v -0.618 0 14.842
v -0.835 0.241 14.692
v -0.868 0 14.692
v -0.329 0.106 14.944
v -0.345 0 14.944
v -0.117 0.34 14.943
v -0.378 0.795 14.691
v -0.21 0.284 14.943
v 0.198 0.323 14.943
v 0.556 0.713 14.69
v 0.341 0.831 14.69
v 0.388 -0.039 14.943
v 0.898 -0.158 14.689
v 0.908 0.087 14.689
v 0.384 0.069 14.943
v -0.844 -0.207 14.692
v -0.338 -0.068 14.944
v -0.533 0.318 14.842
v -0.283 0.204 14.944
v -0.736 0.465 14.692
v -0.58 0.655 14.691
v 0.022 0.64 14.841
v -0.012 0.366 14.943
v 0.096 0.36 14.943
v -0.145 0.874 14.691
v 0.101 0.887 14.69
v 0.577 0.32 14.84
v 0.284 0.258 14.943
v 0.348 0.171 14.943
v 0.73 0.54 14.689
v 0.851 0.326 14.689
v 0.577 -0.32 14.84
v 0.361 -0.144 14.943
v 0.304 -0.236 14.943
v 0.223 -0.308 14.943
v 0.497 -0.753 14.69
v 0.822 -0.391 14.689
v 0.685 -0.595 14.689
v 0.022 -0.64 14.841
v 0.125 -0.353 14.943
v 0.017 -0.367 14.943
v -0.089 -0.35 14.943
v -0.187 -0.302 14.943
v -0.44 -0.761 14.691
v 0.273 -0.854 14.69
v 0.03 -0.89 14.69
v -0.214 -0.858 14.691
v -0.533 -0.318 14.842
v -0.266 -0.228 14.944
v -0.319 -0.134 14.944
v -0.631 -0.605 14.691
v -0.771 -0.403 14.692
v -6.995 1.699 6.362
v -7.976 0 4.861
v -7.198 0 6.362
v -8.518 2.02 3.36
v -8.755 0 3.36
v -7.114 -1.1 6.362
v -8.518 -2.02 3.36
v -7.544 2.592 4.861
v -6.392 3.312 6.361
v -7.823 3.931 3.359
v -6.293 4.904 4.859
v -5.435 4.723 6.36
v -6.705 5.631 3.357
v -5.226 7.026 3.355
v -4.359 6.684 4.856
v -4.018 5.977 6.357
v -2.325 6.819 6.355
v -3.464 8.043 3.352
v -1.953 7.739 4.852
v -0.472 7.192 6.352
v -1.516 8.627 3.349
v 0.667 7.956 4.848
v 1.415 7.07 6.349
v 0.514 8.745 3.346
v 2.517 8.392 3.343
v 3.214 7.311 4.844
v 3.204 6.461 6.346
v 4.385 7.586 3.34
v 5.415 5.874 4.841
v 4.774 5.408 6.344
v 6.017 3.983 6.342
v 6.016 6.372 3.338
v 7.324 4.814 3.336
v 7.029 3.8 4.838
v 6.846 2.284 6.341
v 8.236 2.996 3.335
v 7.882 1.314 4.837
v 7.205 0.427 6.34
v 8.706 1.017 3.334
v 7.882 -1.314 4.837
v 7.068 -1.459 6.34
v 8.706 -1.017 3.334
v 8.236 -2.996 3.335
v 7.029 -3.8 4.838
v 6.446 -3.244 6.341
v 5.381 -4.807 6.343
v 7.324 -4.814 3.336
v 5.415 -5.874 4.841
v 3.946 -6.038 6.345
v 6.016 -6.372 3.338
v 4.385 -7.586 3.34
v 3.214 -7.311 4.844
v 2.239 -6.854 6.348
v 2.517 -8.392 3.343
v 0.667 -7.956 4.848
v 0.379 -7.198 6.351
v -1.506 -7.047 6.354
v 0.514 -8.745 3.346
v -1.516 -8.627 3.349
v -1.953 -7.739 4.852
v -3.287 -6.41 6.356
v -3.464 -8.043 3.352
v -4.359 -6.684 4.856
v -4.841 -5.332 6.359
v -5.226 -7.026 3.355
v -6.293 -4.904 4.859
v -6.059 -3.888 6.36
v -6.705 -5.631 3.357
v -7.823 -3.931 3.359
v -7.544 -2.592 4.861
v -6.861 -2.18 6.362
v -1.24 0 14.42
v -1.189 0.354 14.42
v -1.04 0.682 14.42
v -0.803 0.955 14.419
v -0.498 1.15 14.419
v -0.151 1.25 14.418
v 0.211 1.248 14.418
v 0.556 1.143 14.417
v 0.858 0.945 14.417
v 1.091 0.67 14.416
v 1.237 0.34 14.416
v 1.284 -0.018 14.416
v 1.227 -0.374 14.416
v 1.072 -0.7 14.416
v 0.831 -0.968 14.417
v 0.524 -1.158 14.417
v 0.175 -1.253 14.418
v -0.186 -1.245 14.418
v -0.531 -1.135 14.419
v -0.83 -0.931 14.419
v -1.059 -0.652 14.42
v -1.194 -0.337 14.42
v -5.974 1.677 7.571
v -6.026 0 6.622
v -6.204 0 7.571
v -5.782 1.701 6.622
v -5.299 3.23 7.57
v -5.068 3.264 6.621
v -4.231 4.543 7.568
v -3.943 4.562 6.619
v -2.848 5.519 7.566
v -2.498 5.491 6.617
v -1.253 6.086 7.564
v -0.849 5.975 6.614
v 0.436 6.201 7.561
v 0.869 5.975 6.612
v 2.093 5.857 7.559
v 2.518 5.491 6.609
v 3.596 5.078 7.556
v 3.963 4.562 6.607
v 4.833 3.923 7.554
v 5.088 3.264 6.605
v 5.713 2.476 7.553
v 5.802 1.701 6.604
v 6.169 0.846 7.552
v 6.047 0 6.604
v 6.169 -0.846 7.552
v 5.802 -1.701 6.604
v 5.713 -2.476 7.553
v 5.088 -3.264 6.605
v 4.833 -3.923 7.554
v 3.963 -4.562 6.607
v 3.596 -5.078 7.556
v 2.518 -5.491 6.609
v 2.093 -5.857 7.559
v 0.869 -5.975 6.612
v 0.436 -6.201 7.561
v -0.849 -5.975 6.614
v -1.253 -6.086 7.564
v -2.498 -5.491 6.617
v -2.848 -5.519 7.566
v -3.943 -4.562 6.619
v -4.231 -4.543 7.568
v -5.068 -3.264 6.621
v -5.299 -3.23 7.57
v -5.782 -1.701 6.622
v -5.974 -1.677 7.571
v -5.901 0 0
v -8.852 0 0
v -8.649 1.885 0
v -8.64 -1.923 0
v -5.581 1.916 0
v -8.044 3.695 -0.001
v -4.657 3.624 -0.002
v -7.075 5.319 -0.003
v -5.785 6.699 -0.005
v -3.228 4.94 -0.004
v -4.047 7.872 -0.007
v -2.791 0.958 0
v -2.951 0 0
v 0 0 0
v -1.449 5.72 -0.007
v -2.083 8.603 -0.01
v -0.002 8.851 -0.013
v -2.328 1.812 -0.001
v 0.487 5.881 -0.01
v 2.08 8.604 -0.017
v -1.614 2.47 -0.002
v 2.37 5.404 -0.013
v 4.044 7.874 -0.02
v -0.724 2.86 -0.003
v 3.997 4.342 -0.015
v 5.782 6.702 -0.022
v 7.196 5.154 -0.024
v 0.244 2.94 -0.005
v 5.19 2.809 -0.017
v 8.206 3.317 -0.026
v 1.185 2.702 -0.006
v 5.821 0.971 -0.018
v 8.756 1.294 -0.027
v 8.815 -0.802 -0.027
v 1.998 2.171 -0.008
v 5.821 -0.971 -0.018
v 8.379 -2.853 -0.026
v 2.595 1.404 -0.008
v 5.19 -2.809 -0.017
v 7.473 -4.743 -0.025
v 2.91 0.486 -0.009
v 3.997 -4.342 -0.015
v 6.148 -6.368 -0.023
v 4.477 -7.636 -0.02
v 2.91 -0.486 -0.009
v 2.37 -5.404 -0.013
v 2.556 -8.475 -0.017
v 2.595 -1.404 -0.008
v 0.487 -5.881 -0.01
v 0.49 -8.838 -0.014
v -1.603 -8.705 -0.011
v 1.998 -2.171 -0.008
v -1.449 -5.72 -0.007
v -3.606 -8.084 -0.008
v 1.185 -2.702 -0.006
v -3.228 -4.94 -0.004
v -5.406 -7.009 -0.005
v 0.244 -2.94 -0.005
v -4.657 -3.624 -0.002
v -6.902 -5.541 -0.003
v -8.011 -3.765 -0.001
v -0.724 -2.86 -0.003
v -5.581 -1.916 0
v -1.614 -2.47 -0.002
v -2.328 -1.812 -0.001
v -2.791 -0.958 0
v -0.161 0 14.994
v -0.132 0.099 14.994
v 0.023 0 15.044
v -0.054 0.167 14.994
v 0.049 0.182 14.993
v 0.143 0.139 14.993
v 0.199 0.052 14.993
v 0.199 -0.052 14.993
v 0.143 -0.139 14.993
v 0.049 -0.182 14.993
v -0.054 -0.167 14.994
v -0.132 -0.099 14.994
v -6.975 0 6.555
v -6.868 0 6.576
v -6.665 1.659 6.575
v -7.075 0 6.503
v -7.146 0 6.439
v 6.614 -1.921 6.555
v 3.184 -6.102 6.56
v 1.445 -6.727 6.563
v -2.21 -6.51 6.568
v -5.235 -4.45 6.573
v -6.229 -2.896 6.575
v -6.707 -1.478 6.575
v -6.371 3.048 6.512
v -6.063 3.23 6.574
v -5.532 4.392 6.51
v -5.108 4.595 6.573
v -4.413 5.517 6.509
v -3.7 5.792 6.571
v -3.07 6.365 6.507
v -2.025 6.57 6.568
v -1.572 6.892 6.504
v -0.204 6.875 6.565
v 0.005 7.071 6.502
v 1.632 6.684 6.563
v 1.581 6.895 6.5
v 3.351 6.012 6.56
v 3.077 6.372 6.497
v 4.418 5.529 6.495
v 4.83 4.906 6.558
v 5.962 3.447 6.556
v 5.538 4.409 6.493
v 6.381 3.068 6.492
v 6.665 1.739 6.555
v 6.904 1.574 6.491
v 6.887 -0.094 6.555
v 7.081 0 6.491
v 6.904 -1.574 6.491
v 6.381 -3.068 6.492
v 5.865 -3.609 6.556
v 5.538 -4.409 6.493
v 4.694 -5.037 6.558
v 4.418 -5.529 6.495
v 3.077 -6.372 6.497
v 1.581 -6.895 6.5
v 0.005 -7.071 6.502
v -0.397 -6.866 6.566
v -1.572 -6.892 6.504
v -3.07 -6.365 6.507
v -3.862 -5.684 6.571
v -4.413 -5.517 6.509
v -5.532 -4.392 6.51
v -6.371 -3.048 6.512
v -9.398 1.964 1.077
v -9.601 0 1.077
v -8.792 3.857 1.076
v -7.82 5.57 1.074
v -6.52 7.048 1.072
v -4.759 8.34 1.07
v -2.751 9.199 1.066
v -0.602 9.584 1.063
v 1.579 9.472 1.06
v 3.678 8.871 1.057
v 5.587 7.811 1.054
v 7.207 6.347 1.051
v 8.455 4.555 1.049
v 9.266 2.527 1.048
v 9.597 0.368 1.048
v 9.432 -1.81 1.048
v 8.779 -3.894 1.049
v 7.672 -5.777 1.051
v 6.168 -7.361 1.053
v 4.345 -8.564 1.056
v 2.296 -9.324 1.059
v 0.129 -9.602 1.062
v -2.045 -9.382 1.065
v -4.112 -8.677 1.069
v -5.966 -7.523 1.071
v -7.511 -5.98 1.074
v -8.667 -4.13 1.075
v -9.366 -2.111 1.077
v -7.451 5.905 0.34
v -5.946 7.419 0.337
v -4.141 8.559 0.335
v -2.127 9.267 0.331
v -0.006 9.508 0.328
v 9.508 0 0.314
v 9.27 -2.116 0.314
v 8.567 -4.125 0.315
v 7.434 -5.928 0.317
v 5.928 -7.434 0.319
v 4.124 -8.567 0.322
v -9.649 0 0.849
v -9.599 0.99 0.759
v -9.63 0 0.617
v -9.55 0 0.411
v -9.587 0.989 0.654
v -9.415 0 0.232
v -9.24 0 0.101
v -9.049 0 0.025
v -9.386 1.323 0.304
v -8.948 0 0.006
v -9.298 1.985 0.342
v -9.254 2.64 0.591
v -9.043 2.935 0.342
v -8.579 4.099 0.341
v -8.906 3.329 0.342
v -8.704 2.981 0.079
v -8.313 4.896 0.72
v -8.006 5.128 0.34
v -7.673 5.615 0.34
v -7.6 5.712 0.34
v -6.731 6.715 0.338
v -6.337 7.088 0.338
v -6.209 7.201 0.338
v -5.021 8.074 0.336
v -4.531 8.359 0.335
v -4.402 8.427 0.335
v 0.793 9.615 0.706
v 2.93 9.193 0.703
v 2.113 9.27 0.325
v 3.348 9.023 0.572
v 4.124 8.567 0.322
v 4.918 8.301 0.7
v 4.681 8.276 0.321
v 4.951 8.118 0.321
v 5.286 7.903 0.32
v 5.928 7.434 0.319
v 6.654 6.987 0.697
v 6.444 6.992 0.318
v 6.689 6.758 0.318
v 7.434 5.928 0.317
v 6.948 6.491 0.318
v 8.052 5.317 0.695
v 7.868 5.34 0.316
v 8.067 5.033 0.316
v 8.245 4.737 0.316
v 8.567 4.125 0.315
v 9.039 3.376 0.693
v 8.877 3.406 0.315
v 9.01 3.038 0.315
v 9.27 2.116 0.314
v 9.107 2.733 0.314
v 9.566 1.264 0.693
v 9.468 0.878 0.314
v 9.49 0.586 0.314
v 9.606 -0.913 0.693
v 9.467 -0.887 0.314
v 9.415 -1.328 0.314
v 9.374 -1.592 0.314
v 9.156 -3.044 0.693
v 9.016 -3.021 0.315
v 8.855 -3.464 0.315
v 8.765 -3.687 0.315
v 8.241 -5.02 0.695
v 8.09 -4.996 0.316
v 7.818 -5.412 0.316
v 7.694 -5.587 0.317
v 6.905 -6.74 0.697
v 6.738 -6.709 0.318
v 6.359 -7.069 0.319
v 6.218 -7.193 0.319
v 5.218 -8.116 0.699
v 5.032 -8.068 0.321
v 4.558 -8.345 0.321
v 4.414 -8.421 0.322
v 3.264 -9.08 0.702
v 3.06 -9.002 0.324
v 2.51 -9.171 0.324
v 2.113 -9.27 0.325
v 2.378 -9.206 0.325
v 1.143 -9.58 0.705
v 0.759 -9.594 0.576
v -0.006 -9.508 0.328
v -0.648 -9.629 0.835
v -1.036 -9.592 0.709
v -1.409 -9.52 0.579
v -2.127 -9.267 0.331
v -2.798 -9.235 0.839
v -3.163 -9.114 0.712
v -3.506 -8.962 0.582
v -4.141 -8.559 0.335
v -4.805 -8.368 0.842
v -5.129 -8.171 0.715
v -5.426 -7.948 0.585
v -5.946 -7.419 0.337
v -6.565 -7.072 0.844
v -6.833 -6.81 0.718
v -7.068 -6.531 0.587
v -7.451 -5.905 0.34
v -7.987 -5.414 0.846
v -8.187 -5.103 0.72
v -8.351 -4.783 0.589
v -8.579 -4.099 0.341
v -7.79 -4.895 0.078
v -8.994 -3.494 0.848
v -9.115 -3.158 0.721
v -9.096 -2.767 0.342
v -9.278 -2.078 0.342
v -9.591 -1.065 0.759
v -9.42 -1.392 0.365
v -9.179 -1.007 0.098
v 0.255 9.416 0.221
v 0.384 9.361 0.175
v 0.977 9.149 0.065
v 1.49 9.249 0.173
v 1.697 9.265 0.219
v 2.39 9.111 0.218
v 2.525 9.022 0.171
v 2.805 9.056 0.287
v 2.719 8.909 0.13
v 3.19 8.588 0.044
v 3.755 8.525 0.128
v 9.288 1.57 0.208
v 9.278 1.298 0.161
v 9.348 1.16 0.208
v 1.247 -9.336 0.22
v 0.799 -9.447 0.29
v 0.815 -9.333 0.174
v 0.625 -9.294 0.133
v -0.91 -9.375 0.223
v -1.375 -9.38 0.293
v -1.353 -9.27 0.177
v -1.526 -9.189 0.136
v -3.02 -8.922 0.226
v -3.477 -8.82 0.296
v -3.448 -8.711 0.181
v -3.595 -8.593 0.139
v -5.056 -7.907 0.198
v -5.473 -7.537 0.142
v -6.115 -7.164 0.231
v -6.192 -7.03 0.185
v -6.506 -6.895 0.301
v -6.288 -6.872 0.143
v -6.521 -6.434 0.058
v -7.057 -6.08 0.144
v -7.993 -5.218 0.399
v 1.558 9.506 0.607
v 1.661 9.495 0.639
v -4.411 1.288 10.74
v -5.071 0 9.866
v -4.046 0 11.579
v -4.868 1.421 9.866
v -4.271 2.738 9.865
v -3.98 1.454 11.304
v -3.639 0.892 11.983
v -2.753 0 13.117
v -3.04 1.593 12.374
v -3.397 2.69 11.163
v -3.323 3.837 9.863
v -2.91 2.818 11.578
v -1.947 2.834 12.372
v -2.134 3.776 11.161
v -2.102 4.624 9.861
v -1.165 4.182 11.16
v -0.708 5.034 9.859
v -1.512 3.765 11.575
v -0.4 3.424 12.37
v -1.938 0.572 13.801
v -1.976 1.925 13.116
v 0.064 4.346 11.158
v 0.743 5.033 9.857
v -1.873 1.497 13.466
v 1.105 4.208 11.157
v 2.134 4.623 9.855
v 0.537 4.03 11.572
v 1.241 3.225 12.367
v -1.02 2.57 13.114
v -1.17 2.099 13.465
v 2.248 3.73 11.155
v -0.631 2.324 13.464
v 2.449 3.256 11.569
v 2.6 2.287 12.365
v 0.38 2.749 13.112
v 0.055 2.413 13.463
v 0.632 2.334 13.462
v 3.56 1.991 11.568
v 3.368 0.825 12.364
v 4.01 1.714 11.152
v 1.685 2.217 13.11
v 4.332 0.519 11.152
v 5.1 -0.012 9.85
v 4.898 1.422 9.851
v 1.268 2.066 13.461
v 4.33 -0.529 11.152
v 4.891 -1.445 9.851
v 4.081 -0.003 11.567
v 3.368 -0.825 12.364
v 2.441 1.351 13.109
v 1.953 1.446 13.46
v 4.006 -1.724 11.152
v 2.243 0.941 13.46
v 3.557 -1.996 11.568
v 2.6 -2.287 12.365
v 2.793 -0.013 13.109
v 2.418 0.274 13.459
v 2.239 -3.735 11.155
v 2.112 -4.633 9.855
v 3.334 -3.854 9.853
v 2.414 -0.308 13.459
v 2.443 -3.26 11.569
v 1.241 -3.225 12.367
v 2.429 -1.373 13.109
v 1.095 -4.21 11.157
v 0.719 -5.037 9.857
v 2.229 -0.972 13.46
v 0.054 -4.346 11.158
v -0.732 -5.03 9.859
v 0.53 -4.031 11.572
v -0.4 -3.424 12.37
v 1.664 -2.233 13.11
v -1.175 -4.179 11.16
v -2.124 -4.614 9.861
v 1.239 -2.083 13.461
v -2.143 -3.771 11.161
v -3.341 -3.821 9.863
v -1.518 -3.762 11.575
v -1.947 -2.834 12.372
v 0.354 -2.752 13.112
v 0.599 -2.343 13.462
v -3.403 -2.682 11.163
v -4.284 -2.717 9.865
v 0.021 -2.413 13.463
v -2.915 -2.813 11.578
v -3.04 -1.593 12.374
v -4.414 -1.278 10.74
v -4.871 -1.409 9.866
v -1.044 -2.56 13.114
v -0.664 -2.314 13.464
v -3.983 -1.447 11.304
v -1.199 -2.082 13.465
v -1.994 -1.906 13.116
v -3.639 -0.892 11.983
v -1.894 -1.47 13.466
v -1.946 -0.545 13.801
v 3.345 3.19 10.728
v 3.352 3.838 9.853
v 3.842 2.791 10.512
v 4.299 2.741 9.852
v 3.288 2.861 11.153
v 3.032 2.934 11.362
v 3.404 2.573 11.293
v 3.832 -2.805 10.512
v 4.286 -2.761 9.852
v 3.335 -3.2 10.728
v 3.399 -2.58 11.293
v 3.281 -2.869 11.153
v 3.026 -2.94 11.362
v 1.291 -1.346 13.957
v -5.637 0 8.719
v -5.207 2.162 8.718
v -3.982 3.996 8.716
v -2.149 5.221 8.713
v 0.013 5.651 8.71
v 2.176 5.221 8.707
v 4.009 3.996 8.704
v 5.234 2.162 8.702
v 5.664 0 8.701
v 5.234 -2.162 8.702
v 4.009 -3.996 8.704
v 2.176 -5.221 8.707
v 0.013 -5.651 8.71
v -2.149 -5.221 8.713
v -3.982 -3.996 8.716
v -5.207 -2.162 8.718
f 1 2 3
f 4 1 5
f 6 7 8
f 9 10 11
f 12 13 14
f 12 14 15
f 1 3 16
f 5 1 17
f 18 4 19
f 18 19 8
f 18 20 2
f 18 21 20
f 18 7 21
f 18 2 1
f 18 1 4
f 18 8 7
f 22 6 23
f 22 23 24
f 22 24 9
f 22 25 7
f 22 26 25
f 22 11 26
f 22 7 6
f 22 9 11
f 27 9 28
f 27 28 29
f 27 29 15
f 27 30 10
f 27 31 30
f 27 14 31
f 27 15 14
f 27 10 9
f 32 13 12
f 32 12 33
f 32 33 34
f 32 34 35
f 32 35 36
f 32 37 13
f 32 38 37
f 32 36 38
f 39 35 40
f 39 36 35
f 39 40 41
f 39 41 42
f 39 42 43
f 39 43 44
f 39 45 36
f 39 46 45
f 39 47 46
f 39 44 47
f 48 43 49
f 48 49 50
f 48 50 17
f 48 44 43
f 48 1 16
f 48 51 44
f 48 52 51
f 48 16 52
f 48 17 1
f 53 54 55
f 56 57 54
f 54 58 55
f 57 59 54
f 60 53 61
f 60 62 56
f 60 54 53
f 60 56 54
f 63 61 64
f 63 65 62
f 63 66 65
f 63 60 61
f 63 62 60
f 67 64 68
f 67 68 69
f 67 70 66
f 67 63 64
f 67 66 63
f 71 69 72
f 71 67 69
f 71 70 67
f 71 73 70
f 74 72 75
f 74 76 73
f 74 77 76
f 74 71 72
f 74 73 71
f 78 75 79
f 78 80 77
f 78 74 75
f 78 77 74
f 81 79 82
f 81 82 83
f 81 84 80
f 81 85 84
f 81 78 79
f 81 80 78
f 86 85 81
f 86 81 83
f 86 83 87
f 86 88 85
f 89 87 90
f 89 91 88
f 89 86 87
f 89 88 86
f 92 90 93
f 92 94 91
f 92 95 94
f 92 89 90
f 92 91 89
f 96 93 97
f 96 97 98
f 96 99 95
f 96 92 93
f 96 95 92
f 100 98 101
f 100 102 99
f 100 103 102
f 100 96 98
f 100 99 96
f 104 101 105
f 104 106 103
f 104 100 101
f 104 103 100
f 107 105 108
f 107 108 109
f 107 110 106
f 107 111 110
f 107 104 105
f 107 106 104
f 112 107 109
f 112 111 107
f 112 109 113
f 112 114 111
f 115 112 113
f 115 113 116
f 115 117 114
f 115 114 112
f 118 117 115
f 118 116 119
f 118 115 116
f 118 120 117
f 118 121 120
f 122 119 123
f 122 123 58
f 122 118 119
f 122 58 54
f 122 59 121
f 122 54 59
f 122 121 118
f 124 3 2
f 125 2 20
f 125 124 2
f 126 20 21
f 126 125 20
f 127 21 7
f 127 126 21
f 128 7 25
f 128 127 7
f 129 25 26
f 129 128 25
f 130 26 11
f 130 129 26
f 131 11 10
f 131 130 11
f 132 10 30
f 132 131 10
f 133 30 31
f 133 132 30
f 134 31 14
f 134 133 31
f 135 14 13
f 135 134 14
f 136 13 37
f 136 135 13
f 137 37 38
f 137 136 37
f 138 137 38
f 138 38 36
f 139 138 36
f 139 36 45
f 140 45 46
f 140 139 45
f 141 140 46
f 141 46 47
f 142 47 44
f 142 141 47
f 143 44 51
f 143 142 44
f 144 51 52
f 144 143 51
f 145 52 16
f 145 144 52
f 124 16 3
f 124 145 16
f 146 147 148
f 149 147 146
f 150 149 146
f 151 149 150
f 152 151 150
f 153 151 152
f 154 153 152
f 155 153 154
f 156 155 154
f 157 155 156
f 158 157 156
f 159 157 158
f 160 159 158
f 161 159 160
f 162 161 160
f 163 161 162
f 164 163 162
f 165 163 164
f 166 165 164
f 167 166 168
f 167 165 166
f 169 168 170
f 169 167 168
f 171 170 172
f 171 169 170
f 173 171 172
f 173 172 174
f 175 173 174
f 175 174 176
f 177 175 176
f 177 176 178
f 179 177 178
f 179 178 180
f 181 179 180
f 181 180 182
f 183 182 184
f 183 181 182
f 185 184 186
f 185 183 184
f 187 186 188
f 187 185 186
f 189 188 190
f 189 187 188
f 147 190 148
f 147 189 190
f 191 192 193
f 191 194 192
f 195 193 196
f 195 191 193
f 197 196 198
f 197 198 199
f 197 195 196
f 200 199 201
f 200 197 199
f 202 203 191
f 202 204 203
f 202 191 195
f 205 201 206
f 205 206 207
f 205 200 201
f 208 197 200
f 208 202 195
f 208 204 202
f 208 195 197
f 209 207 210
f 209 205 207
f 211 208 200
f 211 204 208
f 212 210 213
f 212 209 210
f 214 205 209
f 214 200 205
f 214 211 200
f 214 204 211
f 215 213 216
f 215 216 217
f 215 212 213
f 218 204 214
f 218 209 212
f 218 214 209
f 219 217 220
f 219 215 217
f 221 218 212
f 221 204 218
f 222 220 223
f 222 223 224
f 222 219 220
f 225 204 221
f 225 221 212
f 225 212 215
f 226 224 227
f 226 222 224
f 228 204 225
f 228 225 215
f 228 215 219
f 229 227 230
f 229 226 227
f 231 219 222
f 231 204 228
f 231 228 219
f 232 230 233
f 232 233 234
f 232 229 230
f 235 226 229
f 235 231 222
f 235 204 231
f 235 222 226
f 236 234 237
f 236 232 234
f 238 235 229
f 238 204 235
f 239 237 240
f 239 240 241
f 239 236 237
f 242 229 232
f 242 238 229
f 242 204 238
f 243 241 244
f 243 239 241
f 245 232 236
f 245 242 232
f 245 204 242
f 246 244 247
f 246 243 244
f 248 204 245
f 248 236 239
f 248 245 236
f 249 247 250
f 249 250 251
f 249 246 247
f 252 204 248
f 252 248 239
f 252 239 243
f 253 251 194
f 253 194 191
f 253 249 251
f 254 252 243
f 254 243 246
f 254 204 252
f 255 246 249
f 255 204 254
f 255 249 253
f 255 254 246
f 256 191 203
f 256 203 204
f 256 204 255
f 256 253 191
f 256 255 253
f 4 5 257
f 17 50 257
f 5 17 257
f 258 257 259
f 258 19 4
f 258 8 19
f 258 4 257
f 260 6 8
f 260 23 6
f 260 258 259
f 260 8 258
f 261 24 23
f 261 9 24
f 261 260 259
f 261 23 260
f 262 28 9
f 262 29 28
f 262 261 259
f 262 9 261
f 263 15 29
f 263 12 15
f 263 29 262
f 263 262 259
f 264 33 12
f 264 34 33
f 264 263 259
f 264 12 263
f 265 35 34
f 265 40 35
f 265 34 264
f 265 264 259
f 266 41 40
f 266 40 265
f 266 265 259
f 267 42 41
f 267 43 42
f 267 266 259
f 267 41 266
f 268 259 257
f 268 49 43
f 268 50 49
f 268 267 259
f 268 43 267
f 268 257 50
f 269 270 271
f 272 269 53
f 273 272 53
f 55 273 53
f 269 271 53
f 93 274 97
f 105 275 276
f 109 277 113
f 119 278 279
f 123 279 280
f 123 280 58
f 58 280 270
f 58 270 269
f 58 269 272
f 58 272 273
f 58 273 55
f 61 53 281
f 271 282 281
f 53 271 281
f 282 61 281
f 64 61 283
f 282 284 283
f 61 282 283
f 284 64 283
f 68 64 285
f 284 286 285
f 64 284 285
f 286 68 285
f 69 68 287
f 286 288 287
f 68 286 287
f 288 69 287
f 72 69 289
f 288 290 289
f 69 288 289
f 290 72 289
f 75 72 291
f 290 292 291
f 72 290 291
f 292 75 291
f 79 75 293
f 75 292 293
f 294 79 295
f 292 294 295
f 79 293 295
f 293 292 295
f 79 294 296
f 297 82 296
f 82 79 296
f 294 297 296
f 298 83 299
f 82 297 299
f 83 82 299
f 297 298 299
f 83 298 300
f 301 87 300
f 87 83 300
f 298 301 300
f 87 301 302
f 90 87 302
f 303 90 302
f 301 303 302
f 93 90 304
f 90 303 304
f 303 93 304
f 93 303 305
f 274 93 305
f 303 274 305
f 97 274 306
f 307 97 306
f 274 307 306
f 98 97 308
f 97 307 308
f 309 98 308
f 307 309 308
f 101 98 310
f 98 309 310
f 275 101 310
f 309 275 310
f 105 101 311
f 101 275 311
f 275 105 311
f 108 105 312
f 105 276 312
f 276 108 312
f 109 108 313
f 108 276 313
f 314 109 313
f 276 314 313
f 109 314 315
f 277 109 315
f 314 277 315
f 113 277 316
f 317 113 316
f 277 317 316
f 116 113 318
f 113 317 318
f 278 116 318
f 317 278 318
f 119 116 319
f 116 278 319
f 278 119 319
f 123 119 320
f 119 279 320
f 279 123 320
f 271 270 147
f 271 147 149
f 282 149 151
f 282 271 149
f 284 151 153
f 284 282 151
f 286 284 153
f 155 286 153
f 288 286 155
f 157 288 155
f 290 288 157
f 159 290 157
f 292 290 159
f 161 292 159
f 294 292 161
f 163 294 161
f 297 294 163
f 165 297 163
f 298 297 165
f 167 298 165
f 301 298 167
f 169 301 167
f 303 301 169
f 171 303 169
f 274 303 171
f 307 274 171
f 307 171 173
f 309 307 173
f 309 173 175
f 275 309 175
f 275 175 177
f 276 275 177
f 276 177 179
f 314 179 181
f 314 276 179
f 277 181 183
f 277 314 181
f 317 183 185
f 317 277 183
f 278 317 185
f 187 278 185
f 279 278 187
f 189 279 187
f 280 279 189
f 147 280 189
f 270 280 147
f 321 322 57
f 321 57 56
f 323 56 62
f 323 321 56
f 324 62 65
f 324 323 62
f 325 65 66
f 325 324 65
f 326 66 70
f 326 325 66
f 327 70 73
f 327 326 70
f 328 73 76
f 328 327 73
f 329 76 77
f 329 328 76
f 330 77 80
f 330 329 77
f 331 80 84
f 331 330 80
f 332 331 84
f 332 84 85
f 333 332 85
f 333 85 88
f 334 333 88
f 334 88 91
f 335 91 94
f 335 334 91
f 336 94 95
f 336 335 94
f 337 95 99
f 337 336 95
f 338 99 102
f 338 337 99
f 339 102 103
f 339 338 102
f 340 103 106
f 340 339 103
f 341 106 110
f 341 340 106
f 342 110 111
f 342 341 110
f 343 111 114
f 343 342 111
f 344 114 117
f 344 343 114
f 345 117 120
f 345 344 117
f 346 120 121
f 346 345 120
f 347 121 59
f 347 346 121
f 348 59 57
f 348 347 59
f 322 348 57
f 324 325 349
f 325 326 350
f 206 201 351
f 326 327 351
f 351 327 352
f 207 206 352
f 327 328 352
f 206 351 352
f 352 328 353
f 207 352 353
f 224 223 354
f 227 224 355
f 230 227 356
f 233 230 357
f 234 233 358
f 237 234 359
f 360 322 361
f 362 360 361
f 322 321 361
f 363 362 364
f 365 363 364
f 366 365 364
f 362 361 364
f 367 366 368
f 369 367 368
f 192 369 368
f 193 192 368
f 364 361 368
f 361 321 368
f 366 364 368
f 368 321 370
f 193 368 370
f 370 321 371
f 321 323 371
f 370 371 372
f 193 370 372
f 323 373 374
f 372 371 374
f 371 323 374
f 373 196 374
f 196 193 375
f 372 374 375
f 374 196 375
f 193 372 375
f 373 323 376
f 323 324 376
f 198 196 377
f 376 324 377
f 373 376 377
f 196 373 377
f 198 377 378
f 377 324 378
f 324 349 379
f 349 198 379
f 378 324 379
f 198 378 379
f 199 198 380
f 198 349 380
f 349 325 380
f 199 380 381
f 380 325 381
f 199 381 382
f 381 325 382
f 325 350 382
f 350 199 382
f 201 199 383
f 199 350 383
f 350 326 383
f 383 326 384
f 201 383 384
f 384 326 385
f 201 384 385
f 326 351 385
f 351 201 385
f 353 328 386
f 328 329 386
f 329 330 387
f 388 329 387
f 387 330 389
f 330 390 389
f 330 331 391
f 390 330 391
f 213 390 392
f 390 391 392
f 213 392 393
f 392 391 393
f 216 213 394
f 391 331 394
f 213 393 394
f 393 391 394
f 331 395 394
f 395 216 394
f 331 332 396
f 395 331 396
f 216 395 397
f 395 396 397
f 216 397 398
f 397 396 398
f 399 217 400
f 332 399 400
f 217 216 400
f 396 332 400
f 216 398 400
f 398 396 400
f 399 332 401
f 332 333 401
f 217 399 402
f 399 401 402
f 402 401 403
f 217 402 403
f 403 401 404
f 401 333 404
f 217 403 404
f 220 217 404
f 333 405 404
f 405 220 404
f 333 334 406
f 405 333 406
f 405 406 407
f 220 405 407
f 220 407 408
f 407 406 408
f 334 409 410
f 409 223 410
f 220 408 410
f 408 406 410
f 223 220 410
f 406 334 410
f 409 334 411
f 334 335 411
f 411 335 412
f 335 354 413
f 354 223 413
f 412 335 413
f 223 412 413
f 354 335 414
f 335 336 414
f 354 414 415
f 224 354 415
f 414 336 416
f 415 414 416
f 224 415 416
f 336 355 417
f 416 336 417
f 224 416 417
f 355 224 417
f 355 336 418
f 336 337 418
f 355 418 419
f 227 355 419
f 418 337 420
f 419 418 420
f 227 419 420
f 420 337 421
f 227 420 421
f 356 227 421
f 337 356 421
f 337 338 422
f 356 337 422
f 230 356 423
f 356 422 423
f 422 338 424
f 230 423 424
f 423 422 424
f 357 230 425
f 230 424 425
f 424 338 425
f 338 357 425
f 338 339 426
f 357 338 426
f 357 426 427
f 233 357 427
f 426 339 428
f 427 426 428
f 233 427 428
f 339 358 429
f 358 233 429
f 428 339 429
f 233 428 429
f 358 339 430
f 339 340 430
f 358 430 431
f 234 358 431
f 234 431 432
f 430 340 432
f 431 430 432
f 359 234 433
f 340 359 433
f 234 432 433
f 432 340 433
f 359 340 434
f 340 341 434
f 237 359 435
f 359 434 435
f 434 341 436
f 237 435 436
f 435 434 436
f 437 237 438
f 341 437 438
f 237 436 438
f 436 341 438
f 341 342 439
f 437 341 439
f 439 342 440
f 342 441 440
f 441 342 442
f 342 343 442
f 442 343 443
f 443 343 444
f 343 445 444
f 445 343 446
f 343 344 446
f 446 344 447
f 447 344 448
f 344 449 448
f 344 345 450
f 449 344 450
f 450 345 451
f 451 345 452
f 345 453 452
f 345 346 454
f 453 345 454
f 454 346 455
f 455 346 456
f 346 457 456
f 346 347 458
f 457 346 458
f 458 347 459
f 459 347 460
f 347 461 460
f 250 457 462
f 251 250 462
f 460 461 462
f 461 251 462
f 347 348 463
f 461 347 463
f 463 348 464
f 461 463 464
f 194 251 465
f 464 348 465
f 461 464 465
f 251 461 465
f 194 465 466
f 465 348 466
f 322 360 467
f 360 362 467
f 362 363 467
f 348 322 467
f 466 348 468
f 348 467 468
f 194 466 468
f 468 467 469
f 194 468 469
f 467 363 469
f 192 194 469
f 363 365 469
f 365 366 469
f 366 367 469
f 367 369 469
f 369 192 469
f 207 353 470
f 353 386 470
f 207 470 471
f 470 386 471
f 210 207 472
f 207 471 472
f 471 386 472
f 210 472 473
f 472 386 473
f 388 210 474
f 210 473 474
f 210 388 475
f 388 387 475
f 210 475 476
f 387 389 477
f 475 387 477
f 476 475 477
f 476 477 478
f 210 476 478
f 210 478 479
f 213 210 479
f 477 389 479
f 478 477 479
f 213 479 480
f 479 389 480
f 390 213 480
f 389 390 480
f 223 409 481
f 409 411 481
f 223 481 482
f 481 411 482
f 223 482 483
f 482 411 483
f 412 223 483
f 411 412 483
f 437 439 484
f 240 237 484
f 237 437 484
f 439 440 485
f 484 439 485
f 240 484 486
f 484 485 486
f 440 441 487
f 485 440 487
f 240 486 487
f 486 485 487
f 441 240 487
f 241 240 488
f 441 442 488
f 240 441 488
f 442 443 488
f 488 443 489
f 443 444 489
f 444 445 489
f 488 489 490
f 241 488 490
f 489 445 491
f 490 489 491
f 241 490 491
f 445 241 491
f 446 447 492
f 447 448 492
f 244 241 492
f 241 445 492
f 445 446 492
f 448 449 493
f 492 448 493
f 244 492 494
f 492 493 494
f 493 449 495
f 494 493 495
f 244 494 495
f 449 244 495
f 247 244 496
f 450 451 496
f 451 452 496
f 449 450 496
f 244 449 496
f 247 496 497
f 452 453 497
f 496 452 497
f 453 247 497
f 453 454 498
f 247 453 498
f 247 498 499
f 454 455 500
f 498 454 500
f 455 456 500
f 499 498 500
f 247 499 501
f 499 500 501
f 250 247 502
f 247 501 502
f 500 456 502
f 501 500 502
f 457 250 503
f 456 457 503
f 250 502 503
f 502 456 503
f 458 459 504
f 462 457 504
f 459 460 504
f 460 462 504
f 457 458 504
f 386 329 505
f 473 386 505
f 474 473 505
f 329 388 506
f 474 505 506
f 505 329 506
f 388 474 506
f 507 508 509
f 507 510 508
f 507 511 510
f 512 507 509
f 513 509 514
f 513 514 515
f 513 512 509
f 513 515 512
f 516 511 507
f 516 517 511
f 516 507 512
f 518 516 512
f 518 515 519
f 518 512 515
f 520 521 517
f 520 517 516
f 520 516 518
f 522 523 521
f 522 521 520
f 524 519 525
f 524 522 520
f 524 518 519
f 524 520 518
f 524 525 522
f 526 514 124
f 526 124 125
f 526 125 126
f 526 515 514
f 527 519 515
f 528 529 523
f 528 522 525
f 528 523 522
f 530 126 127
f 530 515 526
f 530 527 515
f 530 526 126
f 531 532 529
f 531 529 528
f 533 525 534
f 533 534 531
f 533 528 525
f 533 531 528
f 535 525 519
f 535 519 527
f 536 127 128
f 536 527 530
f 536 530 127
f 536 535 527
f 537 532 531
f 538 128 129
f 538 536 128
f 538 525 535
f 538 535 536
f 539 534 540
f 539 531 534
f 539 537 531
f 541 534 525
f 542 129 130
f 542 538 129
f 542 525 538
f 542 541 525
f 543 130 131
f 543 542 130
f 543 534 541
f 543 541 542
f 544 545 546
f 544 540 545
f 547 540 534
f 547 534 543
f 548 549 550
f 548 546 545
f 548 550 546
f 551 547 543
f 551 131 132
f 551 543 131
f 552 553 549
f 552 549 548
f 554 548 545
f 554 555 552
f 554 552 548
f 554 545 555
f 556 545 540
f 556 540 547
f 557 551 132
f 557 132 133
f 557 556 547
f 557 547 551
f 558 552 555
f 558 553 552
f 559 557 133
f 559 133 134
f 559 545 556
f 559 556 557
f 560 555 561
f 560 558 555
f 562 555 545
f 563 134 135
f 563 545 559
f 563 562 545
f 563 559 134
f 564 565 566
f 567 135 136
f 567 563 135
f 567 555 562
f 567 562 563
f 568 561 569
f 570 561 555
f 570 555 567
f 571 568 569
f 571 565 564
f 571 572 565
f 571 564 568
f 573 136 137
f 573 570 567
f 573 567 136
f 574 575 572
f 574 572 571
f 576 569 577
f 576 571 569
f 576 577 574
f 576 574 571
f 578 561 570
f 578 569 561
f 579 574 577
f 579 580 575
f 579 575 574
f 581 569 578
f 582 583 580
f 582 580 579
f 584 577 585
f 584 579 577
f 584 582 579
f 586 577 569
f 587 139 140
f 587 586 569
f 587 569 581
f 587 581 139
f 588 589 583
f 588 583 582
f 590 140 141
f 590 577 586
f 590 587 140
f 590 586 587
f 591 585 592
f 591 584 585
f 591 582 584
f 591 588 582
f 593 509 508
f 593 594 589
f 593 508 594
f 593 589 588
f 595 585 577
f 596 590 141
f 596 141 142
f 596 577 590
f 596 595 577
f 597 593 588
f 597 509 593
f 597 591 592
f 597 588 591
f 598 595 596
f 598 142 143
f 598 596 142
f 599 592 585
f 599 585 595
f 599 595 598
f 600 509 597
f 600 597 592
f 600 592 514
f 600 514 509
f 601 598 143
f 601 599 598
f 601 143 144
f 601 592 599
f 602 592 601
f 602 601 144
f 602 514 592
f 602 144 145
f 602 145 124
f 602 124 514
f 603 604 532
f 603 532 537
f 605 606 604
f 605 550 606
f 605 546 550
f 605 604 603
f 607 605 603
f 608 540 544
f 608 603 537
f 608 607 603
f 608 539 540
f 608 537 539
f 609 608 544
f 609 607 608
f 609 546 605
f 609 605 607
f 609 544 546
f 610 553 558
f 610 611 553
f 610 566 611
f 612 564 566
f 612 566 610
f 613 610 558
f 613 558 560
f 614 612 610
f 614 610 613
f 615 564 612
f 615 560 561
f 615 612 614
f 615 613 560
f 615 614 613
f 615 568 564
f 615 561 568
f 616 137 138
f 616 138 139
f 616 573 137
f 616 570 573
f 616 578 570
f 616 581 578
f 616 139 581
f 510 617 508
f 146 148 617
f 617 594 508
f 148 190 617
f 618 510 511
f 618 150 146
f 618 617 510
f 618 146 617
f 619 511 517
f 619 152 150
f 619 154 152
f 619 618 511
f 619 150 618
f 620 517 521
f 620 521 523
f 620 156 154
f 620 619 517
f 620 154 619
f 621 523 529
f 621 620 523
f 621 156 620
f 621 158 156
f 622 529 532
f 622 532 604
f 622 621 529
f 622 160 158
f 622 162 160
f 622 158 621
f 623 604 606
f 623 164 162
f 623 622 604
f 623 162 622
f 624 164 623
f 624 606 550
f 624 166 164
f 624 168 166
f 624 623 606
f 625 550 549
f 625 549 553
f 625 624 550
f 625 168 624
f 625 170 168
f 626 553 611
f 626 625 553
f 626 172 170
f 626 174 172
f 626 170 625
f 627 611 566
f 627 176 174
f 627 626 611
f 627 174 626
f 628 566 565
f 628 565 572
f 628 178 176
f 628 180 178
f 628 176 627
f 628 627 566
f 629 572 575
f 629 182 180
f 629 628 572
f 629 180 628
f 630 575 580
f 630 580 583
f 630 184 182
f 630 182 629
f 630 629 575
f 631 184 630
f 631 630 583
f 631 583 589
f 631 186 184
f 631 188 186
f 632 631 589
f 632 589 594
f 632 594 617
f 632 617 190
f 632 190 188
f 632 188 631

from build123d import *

# Parameters (mm, degrees)
F2_R = 0.3965414096
F3_R = 12.4970770477
F4_R = 1.6003475674
F5_R = 0.7991710891


with BuildPart() as f1:
    # F0 (on Front) → F1 (revolve)
    with BuildSketch(Plane.XZ):
        Polygon((-10, 0), (0, 0), (0.0228807389, 15.0439304168), (-0.6294960716, 14.86601048), (-3.7134597207, 12.6123450477), (-6.2043529757, 7.5712513959), (-6.0264319226, 6.6223393607), (-7.093957497, 6.563032219), (-8.7545530004, 3.3604551237), align=None)
    revolve(axis=Axis((0.0114403694, 0, 7.5219652084), (-0.0015209265, 0, -0.9999988434)))

    # F2
    f2_edges = [f1.edges().sort_by_distance(p)[0] for p in [
        (7.113888, 0, 6.541423),
    ]]
    fillet(f2_edges, radius=F2_R)

    # F3
    f3_edges = [f1.edges().sort_by_distance(p)[0] for p in [
        (3.751807, 0, 12.600991),
    ]]
    fillet(f3_edges, radius=F3_R)

    # F4
    f4_edges = [f1.edges().sort_by_distance(p)[0] for p in [
        (0.674713, 0, 14.864027),
    ]]
    fillet(f4_edges, radius=F4_R)

    # F5
    f5_edges = [f1.edges().sort_by_distance(p)[0] for p in [
        (9.999954, 0, -0.030418),
    ]]
    fillet(f5_edges, radius=F5_R)


solid = f1.part
